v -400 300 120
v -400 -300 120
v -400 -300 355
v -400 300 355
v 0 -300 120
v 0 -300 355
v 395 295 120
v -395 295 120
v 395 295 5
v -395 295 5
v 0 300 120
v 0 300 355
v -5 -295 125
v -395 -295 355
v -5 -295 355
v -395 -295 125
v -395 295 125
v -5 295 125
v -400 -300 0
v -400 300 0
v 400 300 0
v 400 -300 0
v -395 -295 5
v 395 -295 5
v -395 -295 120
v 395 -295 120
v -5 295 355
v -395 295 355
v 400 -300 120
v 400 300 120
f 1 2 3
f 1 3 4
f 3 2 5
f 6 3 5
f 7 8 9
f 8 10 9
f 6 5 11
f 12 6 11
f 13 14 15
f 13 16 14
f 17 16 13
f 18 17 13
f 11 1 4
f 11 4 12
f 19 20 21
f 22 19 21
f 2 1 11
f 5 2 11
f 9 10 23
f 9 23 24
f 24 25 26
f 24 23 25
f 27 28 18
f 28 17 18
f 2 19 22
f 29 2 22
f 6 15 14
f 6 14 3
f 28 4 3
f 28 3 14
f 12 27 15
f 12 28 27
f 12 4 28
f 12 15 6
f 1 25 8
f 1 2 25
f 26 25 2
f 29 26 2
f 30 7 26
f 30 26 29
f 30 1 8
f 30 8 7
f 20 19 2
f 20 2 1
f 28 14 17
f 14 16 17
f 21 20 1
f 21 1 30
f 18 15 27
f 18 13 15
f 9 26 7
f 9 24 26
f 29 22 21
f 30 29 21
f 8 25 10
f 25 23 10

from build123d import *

# Parameters (mm, degrees)
F0_W     = 800
F0_H     = 600
F1_DEPTH = 120
F2_T     = -5
F3_W     = 400
F3_H     = 600
F4_DEPTH = 235
F5_T     = -5


with BuildPart() as f1:
    # F0 (on Top) → F1 (new body)
    with BuildSketch(Plane.XY):
        Rectangle(F0_W, F0_H)
    extrude(amount=F1_DEPTH)

    # F2
    f2_openings = [f1.faces().sort_by_distance(p)[0] for p in [
        (0, 0, 120),
    ]]
    offset(amount=F2_T, openings=f2_openings)


with BuildPart() as f4:
    # F3 (on face) → F4 (new body)
    with BuildSketch(Plane.XY.offset(120)):
        with Locations((-200, 0)):
            Rectangle(F3_W, F3_H)
    extrude(amount=F4_DEPTH)

    # F5
    f5_openings = [f4.faces().sort_by_distance(p)[0] for p in [
        (-200, 0, 355),
    ]]
    offset(amount=F5_T, openings=f5_openings)


solid = Compound([f1.part, f4.part])
